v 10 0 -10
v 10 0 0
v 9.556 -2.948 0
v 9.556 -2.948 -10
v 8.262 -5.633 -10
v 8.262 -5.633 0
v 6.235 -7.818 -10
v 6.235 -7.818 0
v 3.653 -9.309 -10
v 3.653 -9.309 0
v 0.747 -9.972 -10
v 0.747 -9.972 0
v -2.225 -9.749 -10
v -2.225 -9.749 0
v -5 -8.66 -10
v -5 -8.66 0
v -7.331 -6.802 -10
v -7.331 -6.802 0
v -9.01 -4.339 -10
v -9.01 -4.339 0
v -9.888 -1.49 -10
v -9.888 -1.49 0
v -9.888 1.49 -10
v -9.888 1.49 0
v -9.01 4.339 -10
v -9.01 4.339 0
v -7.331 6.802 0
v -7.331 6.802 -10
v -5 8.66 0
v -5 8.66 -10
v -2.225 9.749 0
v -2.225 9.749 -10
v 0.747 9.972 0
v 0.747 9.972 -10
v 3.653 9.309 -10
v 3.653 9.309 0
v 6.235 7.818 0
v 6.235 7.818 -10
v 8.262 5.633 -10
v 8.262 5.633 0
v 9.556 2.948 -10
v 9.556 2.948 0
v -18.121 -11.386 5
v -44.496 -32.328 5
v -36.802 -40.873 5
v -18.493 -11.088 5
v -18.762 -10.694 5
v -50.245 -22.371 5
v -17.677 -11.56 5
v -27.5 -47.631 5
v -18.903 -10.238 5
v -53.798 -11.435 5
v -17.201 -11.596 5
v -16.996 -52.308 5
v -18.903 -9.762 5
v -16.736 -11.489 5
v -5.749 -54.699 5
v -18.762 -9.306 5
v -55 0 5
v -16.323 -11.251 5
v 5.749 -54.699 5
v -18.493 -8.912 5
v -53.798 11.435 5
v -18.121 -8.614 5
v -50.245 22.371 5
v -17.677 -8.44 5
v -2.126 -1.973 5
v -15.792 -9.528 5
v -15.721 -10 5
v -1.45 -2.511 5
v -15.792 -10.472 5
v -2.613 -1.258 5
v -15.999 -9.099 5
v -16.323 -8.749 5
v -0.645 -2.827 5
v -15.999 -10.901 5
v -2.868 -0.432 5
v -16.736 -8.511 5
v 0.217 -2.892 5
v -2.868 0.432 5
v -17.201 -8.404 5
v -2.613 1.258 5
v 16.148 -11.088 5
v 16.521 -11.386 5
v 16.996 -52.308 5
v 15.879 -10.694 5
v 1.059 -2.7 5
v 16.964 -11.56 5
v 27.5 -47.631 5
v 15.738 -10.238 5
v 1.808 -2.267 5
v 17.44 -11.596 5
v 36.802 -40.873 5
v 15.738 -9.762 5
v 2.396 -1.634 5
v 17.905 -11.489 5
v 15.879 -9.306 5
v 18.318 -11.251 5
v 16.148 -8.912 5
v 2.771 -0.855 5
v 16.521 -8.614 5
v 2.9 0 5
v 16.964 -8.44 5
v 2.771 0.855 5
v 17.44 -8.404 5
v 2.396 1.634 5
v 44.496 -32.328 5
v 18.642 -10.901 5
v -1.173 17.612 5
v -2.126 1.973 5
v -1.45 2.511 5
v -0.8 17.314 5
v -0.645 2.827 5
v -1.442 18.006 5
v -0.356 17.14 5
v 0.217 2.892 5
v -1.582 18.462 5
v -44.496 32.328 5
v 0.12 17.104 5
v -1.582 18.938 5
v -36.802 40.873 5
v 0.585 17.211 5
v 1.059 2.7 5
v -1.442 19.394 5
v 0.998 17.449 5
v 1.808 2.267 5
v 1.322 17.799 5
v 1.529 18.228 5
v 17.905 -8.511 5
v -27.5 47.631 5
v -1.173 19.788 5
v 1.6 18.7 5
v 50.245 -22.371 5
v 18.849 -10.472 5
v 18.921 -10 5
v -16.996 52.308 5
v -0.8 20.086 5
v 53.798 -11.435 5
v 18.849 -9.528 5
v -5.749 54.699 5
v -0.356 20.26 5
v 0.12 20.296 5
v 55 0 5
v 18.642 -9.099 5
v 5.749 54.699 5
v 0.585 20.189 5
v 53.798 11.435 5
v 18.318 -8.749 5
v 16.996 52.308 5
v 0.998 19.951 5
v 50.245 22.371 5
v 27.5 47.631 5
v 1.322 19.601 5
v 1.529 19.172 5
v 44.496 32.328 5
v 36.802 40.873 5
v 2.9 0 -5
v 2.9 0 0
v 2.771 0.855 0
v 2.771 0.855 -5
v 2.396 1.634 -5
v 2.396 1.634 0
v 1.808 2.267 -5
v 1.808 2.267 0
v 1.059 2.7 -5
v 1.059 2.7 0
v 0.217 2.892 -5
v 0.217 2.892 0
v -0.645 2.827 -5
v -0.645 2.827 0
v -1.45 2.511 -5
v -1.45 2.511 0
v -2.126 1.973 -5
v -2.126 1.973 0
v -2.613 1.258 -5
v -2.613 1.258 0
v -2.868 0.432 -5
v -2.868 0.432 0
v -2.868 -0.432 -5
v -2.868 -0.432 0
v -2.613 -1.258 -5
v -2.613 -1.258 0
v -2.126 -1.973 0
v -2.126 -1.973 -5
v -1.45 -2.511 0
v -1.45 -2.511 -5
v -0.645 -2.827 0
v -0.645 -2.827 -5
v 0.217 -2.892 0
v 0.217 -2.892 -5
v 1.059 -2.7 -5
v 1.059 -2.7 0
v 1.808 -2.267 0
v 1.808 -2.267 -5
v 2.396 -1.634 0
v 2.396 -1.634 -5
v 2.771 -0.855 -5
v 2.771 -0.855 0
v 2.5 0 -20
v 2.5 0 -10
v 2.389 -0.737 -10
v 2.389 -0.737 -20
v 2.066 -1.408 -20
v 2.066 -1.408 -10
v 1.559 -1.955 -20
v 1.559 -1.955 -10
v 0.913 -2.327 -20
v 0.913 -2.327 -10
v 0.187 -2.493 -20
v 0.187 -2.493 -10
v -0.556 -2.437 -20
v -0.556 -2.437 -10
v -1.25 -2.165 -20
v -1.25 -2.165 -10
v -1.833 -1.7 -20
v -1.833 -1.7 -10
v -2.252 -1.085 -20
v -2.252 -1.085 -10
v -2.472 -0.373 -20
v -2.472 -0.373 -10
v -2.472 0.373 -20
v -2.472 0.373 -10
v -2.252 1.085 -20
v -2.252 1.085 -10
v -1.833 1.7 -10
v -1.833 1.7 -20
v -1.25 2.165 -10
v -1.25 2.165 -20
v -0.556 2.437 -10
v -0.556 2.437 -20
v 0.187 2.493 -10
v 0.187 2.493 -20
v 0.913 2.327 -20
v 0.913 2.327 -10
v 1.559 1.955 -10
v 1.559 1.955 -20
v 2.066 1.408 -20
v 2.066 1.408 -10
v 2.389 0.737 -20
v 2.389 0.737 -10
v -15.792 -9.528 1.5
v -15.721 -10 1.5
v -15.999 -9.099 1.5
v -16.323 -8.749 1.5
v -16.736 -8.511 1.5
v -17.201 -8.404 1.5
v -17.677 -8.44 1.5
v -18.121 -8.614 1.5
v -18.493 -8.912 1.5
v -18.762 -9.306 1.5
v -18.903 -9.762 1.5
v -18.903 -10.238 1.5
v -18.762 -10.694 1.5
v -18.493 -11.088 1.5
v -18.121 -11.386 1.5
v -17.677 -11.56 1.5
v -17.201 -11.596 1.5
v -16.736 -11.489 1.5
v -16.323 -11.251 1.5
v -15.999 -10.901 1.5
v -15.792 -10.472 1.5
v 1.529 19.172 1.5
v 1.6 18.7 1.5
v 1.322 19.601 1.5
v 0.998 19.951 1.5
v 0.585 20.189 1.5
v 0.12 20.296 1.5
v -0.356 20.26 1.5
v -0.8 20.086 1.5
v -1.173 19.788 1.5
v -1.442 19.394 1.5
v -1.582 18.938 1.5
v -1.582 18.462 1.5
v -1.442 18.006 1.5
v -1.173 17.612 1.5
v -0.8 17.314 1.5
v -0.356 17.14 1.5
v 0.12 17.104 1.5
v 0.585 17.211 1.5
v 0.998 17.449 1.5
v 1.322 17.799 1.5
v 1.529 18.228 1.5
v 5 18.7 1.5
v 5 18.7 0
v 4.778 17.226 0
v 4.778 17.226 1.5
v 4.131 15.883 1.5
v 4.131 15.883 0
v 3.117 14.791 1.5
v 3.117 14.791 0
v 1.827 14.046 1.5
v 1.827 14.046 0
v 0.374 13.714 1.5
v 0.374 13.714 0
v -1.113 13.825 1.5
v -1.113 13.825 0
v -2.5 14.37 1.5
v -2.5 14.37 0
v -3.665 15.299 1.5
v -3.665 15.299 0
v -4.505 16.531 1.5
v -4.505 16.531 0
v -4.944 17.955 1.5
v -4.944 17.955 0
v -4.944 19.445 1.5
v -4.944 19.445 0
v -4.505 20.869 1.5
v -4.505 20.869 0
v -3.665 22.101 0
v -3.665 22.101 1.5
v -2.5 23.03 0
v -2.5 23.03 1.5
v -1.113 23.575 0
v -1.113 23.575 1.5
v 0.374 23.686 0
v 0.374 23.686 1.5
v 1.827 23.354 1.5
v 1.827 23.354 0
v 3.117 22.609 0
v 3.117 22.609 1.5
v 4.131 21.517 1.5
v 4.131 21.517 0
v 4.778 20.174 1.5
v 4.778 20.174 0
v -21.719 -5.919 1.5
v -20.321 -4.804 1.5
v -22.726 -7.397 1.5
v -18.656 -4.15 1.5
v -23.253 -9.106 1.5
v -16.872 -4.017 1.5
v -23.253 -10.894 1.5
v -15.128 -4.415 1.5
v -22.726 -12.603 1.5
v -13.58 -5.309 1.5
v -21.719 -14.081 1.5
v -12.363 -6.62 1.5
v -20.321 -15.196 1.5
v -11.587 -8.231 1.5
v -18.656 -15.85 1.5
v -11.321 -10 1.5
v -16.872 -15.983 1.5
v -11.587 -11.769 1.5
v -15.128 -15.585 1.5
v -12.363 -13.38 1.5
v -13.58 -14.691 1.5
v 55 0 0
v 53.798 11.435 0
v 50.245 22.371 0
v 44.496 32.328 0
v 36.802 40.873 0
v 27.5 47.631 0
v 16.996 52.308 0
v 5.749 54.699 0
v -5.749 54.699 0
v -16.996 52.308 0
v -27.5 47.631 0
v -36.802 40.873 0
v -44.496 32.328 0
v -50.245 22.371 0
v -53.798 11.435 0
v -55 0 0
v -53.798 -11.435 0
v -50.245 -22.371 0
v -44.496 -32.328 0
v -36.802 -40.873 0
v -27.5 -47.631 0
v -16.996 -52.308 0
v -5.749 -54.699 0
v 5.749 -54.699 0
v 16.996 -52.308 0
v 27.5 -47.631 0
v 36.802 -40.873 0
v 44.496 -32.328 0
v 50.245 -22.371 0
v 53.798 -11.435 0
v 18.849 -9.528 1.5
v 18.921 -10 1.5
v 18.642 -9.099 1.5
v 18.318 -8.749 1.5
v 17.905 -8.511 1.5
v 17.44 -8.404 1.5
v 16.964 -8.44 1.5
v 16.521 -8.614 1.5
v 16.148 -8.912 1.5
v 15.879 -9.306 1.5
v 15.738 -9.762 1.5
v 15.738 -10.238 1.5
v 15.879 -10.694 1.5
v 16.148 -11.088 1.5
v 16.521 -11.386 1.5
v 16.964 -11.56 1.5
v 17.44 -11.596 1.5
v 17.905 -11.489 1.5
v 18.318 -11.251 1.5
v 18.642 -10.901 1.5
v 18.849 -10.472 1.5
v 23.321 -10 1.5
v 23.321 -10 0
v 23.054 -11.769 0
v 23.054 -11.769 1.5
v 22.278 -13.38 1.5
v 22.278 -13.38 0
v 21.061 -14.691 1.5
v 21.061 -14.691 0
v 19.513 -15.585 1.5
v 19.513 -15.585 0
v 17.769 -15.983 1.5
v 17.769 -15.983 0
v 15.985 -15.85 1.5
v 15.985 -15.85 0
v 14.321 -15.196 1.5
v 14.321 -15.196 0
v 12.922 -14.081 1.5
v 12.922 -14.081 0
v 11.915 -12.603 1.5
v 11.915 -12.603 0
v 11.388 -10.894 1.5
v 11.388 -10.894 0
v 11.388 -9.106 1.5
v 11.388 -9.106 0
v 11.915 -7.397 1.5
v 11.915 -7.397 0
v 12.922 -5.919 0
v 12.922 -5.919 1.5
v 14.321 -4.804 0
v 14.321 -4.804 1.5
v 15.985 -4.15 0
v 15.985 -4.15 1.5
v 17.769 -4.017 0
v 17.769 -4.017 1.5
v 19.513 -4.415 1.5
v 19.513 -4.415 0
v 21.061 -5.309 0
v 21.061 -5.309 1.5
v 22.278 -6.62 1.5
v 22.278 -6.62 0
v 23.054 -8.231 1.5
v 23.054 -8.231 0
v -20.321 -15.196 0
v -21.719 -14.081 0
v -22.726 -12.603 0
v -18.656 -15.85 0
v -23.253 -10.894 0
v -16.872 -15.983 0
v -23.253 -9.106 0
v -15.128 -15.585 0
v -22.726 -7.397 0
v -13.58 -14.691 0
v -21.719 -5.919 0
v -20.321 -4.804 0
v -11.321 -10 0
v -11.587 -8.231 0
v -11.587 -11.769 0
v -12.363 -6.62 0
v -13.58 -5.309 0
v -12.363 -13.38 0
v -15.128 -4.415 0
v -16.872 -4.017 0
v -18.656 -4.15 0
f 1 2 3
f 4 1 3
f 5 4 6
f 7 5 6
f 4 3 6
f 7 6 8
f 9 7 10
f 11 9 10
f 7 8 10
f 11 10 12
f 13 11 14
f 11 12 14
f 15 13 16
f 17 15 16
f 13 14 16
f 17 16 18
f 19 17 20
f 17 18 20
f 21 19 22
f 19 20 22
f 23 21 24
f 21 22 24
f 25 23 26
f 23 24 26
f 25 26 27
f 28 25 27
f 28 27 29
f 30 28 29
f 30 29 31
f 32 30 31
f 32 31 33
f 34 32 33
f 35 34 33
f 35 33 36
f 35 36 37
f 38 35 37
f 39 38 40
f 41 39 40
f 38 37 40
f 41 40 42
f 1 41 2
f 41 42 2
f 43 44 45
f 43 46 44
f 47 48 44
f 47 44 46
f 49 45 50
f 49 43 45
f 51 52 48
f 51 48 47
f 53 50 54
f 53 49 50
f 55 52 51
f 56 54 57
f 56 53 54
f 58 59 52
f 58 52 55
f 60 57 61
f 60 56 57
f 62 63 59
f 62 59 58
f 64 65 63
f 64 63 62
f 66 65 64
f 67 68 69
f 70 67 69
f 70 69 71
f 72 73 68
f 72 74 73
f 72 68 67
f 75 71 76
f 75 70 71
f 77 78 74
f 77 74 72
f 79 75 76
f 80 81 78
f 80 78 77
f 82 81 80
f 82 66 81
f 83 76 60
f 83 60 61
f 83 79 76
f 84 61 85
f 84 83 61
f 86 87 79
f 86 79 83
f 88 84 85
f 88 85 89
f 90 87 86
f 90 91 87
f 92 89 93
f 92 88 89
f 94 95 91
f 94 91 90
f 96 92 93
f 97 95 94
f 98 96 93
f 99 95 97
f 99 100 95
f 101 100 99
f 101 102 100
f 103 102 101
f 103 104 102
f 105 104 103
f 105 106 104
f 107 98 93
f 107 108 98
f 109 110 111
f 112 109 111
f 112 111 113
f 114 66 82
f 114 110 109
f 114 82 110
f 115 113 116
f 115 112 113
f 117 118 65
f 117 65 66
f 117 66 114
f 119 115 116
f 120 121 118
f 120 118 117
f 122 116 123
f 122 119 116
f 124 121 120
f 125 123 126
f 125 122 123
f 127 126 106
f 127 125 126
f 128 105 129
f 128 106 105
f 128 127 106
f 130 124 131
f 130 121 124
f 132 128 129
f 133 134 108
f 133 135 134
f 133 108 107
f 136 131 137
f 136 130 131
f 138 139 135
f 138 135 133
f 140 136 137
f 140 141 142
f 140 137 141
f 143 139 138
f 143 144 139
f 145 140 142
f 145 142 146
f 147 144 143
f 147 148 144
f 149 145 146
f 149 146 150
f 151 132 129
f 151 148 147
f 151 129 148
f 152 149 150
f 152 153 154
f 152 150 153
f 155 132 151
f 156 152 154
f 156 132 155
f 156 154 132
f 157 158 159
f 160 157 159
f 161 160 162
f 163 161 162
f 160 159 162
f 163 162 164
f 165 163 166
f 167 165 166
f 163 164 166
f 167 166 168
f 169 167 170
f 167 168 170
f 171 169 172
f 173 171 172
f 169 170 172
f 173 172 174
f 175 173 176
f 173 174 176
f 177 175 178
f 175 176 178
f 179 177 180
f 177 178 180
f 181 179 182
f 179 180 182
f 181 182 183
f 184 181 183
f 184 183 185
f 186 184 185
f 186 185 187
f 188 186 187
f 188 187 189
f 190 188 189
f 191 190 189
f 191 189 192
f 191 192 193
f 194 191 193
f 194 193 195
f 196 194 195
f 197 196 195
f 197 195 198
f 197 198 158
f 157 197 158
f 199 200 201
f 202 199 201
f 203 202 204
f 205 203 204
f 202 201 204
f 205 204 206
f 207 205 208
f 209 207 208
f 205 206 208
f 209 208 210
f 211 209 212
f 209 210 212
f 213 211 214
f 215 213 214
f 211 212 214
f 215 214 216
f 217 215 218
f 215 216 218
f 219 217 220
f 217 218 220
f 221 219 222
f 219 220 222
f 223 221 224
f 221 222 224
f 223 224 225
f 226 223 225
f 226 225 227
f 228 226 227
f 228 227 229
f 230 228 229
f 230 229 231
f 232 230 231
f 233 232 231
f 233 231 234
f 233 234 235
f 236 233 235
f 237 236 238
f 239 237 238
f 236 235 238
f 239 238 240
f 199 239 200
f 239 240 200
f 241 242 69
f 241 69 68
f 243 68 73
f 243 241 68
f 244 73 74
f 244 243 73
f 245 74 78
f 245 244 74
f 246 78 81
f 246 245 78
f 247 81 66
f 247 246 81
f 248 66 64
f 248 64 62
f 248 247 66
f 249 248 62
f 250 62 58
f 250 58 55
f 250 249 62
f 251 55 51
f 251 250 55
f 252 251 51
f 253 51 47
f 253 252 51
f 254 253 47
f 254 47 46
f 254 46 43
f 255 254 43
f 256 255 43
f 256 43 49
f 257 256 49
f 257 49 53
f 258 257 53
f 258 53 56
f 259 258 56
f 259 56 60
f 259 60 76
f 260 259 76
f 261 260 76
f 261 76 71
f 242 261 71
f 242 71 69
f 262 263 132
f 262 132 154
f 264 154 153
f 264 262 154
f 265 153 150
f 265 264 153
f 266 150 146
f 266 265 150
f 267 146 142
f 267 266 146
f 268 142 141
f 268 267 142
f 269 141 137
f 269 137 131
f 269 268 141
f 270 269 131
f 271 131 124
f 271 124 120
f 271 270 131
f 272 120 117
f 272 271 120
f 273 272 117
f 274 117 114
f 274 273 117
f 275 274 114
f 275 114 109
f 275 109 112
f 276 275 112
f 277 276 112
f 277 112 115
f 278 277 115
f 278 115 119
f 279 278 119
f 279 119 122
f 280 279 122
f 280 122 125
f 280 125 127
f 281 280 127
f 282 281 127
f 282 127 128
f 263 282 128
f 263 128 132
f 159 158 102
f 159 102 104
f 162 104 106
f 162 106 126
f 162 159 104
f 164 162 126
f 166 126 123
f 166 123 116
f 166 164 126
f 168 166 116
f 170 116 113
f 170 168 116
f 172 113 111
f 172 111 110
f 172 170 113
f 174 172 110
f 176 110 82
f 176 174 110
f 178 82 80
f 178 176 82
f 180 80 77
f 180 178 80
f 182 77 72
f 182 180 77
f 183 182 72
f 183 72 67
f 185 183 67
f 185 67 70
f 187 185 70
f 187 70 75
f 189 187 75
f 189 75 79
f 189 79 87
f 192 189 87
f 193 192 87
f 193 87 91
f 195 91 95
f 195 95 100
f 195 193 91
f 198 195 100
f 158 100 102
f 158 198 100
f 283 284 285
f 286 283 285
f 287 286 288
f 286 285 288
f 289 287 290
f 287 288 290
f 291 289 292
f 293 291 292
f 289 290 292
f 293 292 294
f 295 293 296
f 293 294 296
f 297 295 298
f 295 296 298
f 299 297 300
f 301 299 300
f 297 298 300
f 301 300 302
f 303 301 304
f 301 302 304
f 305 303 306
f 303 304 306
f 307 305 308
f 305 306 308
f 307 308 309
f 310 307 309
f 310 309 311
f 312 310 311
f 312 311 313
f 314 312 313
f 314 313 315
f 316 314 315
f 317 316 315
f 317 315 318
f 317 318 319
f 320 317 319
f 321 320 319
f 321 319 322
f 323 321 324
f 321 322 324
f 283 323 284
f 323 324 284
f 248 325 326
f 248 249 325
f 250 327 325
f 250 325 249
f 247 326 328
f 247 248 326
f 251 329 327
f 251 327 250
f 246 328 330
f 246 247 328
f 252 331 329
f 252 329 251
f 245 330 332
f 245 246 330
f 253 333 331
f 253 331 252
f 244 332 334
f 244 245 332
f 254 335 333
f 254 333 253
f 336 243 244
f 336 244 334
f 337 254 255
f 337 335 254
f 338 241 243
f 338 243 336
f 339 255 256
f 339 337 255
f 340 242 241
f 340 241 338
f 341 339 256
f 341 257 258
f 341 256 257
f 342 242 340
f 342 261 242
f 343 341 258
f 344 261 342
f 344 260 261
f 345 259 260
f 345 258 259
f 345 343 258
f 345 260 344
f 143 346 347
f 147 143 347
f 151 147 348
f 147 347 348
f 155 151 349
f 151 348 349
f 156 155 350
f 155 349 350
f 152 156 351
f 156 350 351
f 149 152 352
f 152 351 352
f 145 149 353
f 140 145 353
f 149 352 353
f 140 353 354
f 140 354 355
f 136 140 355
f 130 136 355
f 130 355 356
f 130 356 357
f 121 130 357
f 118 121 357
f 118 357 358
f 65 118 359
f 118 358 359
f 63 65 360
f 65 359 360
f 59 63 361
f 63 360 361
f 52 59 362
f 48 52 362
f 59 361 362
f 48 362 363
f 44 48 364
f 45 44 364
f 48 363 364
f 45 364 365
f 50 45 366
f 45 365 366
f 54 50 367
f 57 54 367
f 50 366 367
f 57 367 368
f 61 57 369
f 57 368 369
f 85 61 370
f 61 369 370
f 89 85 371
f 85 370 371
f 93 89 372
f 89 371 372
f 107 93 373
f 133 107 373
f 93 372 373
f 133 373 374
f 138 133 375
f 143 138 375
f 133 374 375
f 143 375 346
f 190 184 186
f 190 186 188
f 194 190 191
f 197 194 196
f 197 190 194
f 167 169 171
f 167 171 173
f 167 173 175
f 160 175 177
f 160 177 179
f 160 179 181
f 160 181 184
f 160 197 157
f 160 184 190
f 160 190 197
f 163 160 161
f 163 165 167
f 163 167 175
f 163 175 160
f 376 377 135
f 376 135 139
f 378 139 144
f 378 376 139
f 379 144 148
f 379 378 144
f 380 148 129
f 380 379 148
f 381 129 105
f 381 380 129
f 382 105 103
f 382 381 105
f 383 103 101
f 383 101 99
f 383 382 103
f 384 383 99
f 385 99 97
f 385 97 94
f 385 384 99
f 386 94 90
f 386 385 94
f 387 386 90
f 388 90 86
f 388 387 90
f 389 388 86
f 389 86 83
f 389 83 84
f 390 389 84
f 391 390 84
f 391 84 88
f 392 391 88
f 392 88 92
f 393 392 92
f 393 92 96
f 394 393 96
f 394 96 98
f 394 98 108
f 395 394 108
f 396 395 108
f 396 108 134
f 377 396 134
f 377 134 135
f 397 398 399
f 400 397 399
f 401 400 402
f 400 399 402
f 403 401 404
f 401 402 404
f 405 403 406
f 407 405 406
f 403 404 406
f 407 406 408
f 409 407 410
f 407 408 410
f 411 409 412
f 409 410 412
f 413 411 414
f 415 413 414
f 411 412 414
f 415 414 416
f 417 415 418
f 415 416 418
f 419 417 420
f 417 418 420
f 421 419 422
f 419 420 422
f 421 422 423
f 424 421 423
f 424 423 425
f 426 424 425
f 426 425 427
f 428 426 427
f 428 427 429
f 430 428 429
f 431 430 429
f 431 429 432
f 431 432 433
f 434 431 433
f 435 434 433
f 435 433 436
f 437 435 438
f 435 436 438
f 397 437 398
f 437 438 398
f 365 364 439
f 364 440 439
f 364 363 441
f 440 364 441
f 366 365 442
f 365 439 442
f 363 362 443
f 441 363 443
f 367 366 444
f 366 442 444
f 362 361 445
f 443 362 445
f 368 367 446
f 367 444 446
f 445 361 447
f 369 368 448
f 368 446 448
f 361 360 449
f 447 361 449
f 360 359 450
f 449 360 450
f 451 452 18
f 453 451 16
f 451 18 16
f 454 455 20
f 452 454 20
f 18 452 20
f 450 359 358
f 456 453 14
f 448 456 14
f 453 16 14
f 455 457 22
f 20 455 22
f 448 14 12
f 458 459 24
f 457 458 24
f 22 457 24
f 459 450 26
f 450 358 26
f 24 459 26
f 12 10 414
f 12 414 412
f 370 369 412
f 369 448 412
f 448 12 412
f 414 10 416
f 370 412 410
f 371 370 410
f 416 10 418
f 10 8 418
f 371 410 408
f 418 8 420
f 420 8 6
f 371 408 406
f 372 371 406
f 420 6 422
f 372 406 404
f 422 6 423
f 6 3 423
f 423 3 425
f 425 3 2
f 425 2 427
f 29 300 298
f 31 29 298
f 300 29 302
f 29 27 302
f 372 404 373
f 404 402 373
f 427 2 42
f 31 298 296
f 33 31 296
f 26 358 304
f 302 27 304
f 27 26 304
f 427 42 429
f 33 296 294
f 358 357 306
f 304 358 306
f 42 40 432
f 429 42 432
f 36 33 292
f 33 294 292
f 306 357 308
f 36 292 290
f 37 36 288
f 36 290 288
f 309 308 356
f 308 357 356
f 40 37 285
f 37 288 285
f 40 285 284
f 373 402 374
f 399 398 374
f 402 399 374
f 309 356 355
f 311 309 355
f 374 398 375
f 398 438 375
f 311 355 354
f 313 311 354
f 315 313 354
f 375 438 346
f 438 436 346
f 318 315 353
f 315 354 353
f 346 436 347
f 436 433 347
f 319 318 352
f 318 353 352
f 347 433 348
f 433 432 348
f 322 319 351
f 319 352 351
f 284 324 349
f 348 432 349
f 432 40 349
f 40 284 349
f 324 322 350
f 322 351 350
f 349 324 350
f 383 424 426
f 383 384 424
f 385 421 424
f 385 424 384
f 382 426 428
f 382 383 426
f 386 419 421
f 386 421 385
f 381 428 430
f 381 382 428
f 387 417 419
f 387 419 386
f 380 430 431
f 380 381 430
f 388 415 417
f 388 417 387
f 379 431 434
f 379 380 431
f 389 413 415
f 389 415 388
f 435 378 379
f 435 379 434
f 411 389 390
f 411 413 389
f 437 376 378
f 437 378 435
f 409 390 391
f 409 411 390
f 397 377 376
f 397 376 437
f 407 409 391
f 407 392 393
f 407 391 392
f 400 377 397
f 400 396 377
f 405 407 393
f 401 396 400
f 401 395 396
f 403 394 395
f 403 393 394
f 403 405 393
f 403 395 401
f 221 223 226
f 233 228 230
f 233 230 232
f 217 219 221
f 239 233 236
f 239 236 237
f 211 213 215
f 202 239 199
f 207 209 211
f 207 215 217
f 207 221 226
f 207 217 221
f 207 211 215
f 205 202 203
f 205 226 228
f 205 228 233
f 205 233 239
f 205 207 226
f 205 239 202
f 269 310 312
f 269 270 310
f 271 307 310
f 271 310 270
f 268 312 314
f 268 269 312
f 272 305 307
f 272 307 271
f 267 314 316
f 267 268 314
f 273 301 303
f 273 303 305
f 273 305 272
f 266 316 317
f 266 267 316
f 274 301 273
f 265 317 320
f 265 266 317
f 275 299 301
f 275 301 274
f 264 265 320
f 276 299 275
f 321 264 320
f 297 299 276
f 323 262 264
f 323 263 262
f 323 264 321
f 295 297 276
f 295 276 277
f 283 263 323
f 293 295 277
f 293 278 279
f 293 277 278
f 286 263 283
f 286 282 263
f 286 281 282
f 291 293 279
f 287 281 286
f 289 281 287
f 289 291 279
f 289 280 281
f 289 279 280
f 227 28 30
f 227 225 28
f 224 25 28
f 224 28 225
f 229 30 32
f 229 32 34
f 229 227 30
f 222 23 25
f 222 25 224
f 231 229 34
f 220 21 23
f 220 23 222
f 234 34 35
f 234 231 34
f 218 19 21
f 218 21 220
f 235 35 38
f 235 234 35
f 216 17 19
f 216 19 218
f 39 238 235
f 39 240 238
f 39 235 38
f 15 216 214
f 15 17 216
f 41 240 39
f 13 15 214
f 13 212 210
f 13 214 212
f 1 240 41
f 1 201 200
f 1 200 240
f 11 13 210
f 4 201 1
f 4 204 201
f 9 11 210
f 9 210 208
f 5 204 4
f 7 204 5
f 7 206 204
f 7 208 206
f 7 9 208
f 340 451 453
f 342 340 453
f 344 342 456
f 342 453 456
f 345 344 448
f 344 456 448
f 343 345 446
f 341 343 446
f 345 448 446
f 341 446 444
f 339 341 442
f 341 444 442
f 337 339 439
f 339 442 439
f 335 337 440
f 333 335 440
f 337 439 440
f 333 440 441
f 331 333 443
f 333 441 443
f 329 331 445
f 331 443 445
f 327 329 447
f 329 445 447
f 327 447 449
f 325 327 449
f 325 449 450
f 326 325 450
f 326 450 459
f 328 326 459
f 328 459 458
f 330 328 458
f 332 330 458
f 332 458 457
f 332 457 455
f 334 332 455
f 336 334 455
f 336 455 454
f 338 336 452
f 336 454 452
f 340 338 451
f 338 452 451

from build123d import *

# Parameters (mm, degrees)
F0_R     = 55
F0_R_2   = 1.6
F0_R_3   = 2.9
F1_DEPTH = 5
F2_R     = 10
F3_DEPTH = 10
F4_R     = 2.9
F5_DEPTH = 10
F6_R     = 2.5
F7_DEPTH = 10
F8_R     = 6
F8_R_2   = 5
F9_DEPTH = 1.5


with BuildPart() as f1:
    # F0 (on Top) → F1 (new body)
    with BuildSketch(Plane.XY):
        Circle(F0_R)
        with Locations((-17.320508, -10)):
            Circle(F0_R_2, mode=Mode.SUBTRACT)
        with Locations((17.320508, -10)):
            Circle(F0_R_2, mode=Mode.SUBTRACT)
        Circle(F0_R_3, mode=Mode.SUBTRACT)
        with Locations((0, 18.7)):
            Circle(F0_R_2, mode=Mode.SUBTRACT)
    extrude(amount=F1_DEPTH)

    # F2 (on face) → F3 (join)
    with BuildSketch(Plane(origin=(0, 0, 0), x_dir=(1, 0, 0), z_dir=(0, 0, -1))):
        Circle(F2_R)
    extrude(amount=F3_DEPTH)

    # F4 (on face) → F5 (cut)
    with BuildSketch(Plane.XY.offset(5)):
        Circle(F4_R)
    extrude(amount=-F5_DEPTH, mode=Mode.SUBTRACT)

    # F6 (on face) → F7 (join)
    with BuildSketch(Plane(origin=(0, 0, -10), x_dir=(1, 0, 0), z_dir=(0, 0, -1))):
        Circle(F6_R)
    extrude(amount=F7_DEPTH)

    # F8 (on face) → F9 (cut)
    with BuildSketch(Plane(origin=(0, 0, 0), x_dir=(1, 0, 0), z_dir=(0, 0, -1))):
        with Locations((-17.320508, 10)):
            Circle(F8_R)
        with Locations((17.320508, 10)):
            Circle(F8_R)
        with Locations((0, -18.7)):
            Circle(F8_R_2)
    extrude(amount=-F9_DEPTH, mode=Mode.SUBTRACT)


solid = f1.part
